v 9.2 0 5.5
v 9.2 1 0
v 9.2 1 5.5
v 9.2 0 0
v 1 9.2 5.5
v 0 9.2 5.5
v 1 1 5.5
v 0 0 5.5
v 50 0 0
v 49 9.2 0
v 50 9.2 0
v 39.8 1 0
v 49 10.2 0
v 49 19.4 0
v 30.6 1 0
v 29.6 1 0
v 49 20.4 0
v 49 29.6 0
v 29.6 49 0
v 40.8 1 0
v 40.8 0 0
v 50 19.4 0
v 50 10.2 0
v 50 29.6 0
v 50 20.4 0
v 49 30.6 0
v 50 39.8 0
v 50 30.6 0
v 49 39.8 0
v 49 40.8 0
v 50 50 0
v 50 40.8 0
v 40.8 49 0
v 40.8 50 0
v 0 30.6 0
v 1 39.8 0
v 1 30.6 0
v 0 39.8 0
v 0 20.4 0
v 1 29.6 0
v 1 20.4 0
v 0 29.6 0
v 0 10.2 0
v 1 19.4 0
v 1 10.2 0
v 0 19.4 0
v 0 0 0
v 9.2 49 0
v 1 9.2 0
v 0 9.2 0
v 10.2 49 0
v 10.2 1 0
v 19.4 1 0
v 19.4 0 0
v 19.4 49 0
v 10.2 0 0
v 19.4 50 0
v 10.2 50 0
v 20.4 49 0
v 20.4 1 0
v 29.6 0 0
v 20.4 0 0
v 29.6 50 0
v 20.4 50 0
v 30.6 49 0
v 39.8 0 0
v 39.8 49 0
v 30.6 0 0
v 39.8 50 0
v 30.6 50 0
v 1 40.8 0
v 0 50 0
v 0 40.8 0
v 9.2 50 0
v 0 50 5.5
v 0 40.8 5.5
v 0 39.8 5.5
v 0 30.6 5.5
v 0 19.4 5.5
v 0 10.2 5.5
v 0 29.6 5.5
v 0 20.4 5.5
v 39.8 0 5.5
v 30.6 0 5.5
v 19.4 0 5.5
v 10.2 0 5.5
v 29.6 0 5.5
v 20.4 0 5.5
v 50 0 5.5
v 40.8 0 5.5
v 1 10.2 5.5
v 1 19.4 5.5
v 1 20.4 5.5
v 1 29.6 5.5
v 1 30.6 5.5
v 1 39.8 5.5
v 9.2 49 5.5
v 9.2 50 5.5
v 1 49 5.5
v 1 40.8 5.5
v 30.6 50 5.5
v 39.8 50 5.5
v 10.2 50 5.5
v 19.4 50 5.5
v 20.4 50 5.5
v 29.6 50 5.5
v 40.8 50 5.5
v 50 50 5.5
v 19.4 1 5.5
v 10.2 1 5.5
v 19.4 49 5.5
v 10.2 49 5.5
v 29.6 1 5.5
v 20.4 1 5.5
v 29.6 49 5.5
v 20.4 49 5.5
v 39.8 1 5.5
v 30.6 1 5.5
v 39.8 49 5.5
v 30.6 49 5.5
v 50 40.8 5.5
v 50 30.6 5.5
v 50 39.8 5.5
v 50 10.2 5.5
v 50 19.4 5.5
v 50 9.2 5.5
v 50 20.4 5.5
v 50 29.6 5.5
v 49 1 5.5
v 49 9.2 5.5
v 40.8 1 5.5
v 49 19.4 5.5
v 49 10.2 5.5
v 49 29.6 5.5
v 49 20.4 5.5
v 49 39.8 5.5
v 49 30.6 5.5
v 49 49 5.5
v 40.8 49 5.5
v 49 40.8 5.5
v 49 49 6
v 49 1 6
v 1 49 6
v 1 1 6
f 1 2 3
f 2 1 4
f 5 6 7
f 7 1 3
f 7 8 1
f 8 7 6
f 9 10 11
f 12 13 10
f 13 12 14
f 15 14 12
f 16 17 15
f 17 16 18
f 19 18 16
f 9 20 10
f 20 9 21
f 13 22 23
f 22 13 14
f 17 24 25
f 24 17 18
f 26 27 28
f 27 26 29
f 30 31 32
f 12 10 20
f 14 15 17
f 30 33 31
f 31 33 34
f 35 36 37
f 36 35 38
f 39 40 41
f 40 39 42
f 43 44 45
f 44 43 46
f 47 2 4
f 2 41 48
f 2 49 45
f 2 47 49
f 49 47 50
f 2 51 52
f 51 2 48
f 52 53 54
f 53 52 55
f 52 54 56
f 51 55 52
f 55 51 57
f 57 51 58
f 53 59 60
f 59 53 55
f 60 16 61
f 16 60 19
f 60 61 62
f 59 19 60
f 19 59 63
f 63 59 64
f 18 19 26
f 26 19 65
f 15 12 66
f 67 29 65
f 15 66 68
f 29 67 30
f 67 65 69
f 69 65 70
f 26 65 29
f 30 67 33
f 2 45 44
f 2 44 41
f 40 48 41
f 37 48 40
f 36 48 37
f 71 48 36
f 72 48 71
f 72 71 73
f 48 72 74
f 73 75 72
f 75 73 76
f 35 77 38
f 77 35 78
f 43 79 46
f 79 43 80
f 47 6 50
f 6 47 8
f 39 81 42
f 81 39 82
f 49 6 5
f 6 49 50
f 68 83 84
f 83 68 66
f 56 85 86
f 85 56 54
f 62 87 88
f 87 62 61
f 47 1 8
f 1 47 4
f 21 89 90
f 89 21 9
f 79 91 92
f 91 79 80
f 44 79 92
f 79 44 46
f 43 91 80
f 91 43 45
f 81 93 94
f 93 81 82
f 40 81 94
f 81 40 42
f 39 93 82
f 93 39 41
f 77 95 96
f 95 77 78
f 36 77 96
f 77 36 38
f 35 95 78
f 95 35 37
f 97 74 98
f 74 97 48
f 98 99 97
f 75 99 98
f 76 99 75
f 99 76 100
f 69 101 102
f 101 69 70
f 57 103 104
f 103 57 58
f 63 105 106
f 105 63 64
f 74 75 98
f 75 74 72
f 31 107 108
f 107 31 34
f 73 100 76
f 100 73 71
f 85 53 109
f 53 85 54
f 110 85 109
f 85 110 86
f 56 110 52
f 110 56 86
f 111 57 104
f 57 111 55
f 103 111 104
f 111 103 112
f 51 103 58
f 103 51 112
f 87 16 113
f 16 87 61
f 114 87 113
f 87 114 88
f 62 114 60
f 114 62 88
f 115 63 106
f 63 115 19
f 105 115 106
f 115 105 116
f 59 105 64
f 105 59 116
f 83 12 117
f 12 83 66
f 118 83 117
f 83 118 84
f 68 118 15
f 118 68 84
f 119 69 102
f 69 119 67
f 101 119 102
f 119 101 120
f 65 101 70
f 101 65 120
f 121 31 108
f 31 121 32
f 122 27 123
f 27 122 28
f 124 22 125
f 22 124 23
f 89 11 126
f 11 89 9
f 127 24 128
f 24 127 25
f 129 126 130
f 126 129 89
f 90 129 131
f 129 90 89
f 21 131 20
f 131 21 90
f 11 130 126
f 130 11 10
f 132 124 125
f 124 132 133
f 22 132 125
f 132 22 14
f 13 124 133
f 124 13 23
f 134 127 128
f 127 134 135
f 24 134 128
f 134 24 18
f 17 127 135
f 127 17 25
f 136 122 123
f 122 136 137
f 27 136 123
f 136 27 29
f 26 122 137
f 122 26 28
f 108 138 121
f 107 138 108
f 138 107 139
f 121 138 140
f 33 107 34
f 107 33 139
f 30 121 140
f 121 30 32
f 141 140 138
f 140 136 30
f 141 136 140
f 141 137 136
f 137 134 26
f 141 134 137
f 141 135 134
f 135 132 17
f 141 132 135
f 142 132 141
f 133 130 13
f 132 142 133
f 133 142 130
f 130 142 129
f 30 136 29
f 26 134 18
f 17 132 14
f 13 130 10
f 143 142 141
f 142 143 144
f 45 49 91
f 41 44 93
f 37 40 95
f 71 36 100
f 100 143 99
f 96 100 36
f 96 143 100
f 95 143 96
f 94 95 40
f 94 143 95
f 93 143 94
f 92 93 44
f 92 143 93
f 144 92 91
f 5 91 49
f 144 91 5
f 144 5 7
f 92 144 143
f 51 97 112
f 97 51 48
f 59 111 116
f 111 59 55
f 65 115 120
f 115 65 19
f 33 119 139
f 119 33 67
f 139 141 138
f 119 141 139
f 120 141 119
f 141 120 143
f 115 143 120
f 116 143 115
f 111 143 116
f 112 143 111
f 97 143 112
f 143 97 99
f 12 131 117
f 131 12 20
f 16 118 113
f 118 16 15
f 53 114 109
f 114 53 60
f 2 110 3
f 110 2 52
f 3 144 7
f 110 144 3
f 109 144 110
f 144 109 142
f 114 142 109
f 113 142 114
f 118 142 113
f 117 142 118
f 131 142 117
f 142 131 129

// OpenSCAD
/* [Base Tile Size] */
x = 2; //[1,2,3,4,5,6]
y = 2; //[1,2,3,4,5,6]

/* [Edge Tile Support] */
// Size of edge tile addition, 9.2 is standard for openforge
edge = 12.5;
left_edge = "false"; // [false,true]
right_edge = "false"; // [false,true]
front_edge = "false"; // [false,true]
back_edge = "false"; // [false,true]

module stone_base(x,y, left_edge="false",right_edge="false",front_edge="false",back_edge="false",edge=12.5) {
    l = left_edge == "true"?edge:0;
    r = right_edge == "true"?edge:0;
    f = front_edge == "true"?edge:0;
    b = back_edge == "true"?edge:0;
    length = 25*x+l+r;
    width = 25*y+f+b;
    xblocks = floor(length / 10.2);
    yblocks = floor(width / 10.2);
    
    color("Grey") intersection() {
        union() {
            for (i = [0:xblocks]) {
                for (j = [0:yblocks]) {
                    if (i == 0 || j == 0 || i == xblocks || j == yblocks) {
                        translate([i*10.2,j*10.2,0]) cube([9.2,9.2,5.5]);
                    }
                }
            }
        }
        cube([length, width, 6]);
    }
    color("Grey") translate([1,1,0]) cube([length-2, width-2, 6]);
}

stone_base(x,y,left_edge,right_edge,front_edge,back_edge,edge);
